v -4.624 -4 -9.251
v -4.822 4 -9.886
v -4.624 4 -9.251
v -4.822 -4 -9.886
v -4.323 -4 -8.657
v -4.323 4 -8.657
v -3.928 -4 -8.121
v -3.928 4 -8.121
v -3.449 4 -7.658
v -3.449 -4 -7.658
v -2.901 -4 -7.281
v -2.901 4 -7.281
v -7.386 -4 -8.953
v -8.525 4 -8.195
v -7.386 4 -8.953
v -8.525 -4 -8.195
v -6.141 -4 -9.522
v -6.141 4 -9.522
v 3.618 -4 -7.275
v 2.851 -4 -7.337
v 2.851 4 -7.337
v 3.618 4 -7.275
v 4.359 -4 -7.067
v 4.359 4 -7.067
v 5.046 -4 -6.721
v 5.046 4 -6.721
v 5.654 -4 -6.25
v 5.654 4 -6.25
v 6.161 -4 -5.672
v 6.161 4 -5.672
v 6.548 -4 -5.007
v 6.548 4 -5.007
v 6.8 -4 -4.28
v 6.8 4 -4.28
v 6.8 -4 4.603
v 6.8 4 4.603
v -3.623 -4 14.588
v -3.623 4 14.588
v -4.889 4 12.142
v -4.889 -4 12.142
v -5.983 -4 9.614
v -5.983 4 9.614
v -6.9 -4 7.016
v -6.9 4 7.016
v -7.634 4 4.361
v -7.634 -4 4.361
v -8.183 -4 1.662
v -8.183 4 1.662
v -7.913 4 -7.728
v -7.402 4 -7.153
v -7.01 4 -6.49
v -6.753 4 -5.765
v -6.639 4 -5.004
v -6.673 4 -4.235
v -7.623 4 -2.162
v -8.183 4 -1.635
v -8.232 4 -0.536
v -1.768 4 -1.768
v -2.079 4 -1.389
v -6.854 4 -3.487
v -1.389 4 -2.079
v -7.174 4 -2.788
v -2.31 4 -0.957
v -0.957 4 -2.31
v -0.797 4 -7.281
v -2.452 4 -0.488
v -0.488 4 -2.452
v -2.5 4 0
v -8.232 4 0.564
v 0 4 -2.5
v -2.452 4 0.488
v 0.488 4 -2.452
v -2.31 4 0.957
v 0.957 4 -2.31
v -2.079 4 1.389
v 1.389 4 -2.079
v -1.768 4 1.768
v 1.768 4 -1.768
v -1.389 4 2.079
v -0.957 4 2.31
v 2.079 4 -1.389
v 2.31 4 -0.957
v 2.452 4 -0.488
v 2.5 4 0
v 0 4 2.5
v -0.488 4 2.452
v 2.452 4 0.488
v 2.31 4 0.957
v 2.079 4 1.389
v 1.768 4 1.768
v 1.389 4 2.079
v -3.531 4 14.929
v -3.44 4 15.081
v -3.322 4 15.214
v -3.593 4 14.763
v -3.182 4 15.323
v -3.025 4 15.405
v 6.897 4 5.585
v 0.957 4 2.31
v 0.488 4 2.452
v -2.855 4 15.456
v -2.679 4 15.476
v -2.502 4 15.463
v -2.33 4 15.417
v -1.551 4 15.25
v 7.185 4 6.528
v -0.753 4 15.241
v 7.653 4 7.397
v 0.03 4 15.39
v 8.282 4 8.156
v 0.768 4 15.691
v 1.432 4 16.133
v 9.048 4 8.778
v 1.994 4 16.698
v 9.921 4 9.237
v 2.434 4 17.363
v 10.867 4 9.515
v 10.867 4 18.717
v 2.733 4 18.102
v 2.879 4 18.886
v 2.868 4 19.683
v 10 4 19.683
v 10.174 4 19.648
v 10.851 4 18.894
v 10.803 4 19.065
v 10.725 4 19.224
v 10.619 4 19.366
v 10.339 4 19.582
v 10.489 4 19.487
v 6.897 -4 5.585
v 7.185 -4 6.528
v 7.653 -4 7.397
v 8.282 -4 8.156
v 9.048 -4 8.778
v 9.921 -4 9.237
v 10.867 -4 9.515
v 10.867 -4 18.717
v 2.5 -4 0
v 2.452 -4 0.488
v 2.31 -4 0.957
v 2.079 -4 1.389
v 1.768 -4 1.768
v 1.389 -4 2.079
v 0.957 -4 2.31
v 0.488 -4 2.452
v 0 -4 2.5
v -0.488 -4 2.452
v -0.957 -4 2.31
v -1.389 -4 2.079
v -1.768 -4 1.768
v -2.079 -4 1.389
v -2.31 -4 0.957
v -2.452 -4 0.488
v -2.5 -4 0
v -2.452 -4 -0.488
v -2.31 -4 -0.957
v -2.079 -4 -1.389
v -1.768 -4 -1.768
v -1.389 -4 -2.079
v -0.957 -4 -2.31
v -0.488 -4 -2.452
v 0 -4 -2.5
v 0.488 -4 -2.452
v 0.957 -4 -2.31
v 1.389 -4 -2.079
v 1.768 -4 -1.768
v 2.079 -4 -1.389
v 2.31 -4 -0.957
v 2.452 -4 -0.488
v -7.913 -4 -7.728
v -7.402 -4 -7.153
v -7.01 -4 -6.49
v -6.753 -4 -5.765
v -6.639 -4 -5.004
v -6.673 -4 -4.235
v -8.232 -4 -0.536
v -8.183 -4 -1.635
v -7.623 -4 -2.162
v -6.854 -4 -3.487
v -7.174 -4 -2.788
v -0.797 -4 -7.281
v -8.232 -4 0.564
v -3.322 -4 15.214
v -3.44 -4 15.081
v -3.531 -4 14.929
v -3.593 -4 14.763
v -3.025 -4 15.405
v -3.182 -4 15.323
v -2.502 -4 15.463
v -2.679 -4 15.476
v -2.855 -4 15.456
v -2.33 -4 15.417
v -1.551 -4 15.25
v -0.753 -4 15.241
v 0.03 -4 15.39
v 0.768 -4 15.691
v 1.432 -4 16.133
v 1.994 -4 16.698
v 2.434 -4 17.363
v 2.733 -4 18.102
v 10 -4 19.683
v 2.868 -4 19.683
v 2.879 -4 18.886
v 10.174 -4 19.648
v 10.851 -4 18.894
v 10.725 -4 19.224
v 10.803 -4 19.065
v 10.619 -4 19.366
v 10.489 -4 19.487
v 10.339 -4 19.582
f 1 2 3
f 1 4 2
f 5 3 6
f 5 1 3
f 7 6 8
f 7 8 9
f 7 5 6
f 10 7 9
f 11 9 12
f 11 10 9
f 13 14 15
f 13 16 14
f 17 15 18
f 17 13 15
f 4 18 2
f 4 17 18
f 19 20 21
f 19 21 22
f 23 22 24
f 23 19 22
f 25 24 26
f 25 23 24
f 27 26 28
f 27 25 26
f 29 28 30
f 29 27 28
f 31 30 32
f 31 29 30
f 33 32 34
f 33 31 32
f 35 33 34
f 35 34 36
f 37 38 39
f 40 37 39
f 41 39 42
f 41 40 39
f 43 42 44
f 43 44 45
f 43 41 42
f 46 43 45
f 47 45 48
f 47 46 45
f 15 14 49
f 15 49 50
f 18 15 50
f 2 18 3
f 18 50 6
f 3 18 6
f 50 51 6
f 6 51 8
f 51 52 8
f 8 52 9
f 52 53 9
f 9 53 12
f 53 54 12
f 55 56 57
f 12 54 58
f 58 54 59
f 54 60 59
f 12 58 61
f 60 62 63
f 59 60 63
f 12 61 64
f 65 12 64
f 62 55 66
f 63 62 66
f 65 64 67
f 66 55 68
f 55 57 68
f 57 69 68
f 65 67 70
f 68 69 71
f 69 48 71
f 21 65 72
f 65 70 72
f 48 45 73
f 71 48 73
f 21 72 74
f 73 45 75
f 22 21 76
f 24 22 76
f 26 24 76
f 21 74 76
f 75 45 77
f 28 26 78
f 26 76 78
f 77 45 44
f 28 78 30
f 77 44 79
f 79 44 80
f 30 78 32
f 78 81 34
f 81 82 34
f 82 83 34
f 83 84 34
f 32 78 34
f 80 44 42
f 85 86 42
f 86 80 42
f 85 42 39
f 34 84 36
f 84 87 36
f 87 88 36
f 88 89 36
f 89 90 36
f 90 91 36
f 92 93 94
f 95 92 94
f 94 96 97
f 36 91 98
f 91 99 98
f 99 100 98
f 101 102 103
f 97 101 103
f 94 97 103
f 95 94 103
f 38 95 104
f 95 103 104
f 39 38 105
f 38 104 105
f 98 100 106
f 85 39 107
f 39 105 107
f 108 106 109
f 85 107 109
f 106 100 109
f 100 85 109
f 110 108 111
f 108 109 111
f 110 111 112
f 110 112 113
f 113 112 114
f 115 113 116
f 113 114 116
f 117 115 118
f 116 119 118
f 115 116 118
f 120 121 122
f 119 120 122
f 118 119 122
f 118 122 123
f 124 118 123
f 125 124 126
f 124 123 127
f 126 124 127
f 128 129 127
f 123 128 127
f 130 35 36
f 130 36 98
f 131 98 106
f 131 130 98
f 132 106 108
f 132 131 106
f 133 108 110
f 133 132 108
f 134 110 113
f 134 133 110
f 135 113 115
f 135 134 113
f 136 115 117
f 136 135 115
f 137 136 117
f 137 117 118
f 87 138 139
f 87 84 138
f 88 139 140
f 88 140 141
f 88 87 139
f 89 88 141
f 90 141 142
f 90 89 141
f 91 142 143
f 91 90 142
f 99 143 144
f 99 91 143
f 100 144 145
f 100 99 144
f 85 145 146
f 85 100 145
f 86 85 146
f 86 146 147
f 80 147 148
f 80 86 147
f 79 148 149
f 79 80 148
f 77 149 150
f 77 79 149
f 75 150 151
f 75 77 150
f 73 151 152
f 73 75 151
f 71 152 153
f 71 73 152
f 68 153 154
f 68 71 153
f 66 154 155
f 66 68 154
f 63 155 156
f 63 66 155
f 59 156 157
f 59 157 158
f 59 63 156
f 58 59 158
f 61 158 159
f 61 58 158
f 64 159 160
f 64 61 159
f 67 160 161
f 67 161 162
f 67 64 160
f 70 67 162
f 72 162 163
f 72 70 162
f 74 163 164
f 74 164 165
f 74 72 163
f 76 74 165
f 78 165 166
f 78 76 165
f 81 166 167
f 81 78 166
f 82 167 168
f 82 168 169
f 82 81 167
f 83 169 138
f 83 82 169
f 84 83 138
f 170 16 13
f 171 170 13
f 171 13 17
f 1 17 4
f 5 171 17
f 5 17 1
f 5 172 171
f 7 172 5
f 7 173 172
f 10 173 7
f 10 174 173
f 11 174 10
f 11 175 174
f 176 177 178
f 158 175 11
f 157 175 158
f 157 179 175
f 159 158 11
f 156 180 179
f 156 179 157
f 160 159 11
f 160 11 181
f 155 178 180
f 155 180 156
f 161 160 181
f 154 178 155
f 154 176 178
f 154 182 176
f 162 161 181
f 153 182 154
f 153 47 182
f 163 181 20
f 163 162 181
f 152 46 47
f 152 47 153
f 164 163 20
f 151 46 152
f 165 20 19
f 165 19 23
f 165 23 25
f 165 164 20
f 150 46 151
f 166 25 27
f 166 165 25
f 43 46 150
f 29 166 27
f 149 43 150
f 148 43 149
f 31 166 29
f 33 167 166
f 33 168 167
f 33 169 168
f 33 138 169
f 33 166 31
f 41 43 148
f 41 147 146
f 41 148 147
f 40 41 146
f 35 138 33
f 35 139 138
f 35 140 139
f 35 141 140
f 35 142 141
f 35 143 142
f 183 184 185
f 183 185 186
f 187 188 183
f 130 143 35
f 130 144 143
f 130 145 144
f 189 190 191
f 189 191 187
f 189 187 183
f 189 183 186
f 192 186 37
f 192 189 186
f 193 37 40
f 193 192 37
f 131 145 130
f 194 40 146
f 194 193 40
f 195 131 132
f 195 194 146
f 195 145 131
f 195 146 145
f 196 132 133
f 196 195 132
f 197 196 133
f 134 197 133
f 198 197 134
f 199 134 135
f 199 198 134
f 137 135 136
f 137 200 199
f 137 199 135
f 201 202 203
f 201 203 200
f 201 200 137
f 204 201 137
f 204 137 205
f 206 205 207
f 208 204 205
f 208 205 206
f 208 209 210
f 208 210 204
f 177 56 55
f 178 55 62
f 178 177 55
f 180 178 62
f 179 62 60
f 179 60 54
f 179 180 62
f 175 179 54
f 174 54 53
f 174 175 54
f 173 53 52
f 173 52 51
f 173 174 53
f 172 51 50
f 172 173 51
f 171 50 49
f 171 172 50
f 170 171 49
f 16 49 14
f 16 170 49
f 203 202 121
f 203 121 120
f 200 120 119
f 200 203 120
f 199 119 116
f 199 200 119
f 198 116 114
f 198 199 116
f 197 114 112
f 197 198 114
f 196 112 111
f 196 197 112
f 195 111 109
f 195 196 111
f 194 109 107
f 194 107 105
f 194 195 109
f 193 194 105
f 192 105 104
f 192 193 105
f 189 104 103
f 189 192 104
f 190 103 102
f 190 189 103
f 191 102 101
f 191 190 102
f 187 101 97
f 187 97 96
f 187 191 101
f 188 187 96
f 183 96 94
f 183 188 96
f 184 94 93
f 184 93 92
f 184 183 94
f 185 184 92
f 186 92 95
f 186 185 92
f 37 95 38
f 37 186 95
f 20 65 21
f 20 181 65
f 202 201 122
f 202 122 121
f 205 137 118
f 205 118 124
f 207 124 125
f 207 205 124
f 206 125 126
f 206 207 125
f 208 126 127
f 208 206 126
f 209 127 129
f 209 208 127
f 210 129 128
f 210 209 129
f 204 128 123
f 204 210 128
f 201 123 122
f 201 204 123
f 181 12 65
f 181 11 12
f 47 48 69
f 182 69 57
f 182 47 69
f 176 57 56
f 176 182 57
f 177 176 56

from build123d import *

# Parameters (mm, degrees)
F0_R     = 2.5
F1_DEPTH = 4


with BuildPart() as f1:
    # F0 (on Front) → F1 (new body, symmetric)
    with BuildSketch(Plane.XZ):
        with BuildLine():
            Line((-0.797178, -7.280593), (2.851209, -7.336721))
            ThreePointArc((2.851209, -7.336721), (5.361142, -6.500314), (6.8, -4.280173))
            Line((6.8, -4.280173), (6.8, 4.603175))
            ThreePointArc((6.8, 4.603175), (7.948803, 7.791949), (10.867313, 9.515414))
            Line((10.867313, 9.515414), (10.867313, 18.717312))
            ThreePointArc((10.867313, 18.717312), (10.61867, 19.366425), (10, 19.683313))
            Line((10, 19.683313), (2.86759, 19.683313))
            ThreePointArc((2.86759, 19.683313), (1.43159, 16.133334), (-2.330272, 15.417209))
            ThreePointArc((-2.330272, 15.417209), (-3.182277, 15.323191), (-3.623003, 14.587997))
            ThreePointArc((-3.623003, 14.587997), (-6.463829, 8.322883), (-8.182797, 1.66202))
            ThreePointArc((-8.182797, 1.66202), (-8.238145, 0.013758), (-8.182797, -1.634504))
            ThreePointArc((-8.182797, -1.634504), (-6.638926, -5.004085), (-8.524801, -8.194867))
            ThreePointArc((-8.524801, -8.194867), (-6.774749, -9.262294), (-4.822111, -9.88622))
            ThreePointArc((-4.822111, -9.88622), (-4.136805, -8.380333), (-2.900719, -7.280593))
            Line((-2.900719, -7.280593), (-0.797178, -7.280593))
        make_face()
        Circle(F0_R, mode=Mode.SUBTRACT)
    extrude(amount=F1_DEPTH, both=True)


solid = f1.part
